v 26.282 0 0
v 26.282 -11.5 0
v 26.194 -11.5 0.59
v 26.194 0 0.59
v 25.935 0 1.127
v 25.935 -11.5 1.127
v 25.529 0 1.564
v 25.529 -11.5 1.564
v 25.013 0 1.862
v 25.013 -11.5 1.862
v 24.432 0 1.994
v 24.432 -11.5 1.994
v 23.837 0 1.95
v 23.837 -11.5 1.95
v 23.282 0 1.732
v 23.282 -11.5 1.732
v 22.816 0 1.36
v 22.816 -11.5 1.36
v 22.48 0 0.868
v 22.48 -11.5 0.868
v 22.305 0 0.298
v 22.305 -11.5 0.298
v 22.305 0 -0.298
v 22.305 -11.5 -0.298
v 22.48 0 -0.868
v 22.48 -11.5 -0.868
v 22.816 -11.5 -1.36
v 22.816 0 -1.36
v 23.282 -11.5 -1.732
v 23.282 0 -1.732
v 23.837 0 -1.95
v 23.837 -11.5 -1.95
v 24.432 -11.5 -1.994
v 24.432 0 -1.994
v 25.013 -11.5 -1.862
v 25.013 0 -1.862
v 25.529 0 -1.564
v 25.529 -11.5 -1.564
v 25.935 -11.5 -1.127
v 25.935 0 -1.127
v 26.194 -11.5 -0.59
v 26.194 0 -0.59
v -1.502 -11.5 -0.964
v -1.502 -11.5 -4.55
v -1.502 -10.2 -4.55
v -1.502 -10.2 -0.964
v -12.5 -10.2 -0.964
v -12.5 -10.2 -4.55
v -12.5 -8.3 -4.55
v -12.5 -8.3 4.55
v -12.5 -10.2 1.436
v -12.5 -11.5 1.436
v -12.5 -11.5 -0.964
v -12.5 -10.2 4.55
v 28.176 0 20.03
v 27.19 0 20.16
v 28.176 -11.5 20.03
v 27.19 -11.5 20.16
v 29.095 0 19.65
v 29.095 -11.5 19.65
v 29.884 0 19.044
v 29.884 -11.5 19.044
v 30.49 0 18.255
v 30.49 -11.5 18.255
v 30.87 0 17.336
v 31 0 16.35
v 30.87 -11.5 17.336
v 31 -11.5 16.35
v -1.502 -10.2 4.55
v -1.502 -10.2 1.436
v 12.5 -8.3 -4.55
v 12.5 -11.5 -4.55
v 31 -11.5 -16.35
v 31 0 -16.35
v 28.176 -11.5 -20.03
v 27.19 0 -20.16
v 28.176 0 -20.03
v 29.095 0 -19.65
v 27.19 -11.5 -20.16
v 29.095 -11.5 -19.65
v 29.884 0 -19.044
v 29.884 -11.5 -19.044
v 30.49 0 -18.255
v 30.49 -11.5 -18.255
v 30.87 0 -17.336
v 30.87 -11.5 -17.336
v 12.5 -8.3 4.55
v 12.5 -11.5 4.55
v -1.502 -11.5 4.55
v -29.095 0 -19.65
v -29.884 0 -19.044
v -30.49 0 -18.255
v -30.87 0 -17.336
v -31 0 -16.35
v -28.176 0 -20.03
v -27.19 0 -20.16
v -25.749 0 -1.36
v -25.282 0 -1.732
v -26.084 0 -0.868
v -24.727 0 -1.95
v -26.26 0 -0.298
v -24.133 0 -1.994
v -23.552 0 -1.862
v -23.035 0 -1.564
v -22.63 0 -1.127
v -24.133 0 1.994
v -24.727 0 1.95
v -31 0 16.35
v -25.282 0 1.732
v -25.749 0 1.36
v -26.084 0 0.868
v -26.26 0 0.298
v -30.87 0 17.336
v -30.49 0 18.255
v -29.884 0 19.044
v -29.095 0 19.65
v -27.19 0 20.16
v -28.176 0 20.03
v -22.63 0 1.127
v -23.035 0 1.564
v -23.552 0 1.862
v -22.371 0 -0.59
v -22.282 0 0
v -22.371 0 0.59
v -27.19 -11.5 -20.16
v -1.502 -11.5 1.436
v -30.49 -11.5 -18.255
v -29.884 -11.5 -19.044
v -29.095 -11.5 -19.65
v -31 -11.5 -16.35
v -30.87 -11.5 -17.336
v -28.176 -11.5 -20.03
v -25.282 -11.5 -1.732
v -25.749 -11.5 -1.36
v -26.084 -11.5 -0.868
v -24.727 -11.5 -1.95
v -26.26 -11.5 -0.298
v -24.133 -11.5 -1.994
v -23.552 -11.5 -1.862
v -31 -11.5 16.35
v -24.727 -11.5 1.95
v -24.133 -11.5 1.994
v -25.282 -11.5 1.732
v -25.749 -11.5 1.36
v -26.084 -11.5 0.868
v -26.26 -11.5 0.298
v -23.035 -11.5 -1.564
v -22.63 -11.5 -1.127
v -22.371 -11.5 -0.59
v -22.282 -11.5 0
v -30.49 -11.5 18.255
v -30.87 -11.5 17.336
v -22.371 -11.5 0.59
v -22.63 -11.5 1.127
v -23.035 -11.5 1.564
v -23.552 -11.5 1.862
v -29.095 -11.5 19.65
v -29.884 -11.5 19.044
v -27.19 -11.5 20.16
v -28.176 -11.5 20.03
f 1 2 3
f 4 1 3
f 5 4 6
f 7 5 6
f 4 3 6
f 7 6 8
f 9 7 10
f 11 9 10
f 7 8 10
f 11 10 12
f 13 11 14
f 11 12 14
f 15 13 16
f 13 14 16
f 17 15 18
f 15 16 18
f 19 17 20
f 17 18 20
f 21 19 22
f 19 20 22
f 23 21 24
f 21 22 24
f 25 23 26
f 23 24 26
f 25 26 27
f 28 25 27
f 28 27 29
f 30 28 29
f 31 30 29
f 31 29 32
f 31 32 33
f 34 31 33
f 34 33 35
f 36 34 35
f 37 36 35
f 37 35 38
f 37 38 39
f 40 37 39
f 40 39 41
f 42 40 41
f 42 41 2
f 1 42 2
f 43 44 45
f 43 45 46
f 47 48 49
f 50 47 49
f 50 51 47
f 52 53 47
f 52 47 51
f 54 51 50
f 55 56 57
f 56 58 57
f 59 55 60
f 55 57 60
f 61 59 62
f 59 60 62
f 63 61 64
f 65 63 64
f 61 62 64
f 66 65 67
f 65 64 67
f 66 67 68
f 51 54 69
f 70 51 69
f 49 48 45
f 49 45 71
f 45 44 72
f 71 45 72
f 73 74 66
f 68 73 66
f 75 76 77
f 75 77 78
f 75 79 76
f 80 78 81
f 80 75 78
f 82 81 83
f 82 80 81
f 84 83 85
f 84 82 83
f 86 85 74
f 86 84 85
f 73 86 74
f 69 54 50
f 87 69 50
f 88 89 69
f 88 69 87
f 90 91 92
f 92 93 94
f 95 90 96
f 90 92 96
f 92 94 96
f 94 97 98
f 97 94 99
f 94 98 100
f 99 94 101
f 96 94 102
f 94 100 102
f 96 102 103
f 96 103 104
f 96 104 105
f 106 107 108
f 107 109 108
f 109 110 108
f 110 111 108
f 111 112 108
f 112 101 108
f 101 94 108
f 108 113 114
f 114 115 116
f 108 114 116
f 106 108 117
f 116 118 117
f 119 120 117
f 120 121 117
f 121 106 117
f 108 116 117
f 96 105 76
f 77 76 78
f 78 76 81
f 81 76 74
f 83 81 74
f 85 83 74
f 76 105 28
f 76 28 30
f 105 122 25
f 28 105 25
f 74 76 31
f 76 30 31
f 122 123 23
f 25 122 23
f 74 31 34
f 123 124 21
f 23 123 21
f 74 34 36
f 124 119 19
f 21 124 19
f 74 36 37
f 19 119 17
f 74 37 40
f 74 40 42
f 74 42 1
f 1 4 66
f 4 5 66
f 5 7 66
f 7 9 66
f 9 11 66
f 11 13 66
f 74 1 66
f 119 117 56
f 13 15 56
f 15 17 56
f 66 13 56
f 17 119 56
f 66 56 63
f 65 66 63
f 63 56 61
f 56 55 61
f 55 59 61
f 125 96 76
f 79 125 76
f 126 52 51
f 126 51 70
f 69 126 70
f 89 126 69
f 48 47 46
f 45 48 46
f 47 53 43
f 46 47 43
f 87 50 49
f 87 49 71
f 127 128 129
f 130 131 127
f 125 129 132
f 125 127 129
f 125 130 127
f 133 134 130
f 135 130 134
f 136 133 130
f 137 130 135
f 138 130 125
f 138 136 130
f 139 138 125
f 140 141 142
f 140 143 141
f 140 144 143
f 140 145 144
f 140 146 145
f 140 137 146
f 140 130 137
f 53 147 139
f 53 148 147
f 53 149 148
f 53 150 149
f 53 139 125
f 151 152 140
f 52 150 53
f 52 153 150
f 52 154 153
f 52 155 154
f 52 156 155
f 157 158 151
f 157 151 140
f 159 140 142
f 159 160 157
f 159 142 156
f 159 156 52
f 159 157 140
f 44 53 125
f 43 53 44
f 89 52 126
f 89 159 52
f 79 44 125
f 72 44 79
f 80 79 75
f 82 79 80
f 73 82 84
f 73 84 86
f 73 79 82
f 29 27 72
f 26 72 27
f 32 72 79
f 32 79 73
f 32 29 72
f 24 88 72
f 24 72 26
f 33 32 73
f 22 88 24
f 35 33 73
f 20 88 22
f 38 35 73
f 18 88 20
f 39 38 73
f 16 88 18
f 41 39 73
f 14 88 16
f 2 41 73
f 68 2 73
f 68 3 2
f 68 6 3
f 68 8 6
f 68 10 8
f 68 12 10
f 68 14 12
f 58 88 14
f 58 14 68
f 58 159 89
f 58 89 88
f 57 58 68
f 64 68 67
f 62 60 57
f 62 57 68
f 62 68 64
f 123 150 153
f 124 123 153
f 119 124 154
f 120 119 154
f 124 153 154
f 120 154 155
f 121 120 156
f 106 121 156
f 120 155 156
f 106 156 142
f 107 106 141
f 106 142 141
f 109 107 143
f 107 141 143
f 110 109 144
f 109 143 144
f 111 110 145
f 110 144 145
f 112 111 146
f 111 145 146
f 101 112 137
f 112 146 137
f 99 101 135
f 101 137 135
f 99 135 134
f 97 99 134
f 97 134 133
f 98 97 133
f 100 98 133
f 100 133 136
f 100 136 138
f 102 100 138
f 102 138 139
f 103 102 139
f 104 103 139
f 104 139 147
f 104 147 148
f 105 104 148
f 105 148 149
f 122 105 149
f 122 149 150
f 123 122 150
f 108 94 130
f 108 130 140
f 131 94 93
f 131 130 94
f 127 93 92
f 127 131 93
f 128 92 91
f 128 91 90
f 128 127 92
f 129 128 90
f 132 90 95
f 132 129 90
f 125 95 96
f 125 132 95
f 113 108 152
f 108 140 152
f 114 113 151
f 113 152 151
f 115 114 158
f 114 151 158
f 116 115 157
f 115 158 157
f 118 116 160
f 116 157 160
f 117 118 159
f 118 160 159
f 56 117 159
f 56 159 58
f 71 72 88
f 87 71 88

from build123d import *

# Parameters (mm, degrees)
F0_W     = 62
F0_H     = 40.32
F1_DEPTH = 11.5
F2_W     = 25
F2_H     = 9.1
F3_DEPTH = 3.2
F4_W     = 10.9982
F4_H     = 3.114462
F4_H_2   = 3.585538
F5_DEPTH = 1.3
F6_R     = 3.81
F7_R     = 2
F8_DEPTH = 15.24


with BuildPart() as f1:
    # F0 (on Front) → F1 (new body)
    with BuildSketch(Plane.XZ):
        Rectangle(F0_W, F0_H)
    extrude(amount=F1_DEPTH)

    # F2 (on face) → F3 (cut)
    with BuildSketch(Plane.XZ.offset(11.5)):
        Rectangle(F2_W, F2_H)
    extrude(amount=-F3_DEPTH, mode=Mode.SUBTRACT)

    # F4 (on face) → F5 (join)
    with BuildSketch(Plane.XZ.offset(11.5)):
        with Locations((-7.0009, 2.992769)):
            Rectangle(F4_W, F4_H)
        with Locations((-7.0009, -2.757231)):
            Rectangle(F4_W, F4_H_2)
    extrude(amount=-F5_DEPTH)

    # F6
    f6_edges = [f1.edges().sort_by_distance(p)[0] for p in [
        (-31, -5.75, 20.16),
        (31, -5.75, 20.16),
        (31, -5.75, -20.16),
        (-31, -5.75, -20.16),
    ]]
    fillet(f6_edges, radius=F6_R)

    # F7 (on face) → F8 (cut)
    with BuildSketch(Plane.XZ.offset(11.5)):
        with Locations((-24.2824, 0)):
            Circle(F7_R)
        with Locations((24.2824, 0)):
            Circle(F7_R)
    extrude(amount=-F8_DEPTH, mode=Mode.SUBTRACT)


solid = f1.part
